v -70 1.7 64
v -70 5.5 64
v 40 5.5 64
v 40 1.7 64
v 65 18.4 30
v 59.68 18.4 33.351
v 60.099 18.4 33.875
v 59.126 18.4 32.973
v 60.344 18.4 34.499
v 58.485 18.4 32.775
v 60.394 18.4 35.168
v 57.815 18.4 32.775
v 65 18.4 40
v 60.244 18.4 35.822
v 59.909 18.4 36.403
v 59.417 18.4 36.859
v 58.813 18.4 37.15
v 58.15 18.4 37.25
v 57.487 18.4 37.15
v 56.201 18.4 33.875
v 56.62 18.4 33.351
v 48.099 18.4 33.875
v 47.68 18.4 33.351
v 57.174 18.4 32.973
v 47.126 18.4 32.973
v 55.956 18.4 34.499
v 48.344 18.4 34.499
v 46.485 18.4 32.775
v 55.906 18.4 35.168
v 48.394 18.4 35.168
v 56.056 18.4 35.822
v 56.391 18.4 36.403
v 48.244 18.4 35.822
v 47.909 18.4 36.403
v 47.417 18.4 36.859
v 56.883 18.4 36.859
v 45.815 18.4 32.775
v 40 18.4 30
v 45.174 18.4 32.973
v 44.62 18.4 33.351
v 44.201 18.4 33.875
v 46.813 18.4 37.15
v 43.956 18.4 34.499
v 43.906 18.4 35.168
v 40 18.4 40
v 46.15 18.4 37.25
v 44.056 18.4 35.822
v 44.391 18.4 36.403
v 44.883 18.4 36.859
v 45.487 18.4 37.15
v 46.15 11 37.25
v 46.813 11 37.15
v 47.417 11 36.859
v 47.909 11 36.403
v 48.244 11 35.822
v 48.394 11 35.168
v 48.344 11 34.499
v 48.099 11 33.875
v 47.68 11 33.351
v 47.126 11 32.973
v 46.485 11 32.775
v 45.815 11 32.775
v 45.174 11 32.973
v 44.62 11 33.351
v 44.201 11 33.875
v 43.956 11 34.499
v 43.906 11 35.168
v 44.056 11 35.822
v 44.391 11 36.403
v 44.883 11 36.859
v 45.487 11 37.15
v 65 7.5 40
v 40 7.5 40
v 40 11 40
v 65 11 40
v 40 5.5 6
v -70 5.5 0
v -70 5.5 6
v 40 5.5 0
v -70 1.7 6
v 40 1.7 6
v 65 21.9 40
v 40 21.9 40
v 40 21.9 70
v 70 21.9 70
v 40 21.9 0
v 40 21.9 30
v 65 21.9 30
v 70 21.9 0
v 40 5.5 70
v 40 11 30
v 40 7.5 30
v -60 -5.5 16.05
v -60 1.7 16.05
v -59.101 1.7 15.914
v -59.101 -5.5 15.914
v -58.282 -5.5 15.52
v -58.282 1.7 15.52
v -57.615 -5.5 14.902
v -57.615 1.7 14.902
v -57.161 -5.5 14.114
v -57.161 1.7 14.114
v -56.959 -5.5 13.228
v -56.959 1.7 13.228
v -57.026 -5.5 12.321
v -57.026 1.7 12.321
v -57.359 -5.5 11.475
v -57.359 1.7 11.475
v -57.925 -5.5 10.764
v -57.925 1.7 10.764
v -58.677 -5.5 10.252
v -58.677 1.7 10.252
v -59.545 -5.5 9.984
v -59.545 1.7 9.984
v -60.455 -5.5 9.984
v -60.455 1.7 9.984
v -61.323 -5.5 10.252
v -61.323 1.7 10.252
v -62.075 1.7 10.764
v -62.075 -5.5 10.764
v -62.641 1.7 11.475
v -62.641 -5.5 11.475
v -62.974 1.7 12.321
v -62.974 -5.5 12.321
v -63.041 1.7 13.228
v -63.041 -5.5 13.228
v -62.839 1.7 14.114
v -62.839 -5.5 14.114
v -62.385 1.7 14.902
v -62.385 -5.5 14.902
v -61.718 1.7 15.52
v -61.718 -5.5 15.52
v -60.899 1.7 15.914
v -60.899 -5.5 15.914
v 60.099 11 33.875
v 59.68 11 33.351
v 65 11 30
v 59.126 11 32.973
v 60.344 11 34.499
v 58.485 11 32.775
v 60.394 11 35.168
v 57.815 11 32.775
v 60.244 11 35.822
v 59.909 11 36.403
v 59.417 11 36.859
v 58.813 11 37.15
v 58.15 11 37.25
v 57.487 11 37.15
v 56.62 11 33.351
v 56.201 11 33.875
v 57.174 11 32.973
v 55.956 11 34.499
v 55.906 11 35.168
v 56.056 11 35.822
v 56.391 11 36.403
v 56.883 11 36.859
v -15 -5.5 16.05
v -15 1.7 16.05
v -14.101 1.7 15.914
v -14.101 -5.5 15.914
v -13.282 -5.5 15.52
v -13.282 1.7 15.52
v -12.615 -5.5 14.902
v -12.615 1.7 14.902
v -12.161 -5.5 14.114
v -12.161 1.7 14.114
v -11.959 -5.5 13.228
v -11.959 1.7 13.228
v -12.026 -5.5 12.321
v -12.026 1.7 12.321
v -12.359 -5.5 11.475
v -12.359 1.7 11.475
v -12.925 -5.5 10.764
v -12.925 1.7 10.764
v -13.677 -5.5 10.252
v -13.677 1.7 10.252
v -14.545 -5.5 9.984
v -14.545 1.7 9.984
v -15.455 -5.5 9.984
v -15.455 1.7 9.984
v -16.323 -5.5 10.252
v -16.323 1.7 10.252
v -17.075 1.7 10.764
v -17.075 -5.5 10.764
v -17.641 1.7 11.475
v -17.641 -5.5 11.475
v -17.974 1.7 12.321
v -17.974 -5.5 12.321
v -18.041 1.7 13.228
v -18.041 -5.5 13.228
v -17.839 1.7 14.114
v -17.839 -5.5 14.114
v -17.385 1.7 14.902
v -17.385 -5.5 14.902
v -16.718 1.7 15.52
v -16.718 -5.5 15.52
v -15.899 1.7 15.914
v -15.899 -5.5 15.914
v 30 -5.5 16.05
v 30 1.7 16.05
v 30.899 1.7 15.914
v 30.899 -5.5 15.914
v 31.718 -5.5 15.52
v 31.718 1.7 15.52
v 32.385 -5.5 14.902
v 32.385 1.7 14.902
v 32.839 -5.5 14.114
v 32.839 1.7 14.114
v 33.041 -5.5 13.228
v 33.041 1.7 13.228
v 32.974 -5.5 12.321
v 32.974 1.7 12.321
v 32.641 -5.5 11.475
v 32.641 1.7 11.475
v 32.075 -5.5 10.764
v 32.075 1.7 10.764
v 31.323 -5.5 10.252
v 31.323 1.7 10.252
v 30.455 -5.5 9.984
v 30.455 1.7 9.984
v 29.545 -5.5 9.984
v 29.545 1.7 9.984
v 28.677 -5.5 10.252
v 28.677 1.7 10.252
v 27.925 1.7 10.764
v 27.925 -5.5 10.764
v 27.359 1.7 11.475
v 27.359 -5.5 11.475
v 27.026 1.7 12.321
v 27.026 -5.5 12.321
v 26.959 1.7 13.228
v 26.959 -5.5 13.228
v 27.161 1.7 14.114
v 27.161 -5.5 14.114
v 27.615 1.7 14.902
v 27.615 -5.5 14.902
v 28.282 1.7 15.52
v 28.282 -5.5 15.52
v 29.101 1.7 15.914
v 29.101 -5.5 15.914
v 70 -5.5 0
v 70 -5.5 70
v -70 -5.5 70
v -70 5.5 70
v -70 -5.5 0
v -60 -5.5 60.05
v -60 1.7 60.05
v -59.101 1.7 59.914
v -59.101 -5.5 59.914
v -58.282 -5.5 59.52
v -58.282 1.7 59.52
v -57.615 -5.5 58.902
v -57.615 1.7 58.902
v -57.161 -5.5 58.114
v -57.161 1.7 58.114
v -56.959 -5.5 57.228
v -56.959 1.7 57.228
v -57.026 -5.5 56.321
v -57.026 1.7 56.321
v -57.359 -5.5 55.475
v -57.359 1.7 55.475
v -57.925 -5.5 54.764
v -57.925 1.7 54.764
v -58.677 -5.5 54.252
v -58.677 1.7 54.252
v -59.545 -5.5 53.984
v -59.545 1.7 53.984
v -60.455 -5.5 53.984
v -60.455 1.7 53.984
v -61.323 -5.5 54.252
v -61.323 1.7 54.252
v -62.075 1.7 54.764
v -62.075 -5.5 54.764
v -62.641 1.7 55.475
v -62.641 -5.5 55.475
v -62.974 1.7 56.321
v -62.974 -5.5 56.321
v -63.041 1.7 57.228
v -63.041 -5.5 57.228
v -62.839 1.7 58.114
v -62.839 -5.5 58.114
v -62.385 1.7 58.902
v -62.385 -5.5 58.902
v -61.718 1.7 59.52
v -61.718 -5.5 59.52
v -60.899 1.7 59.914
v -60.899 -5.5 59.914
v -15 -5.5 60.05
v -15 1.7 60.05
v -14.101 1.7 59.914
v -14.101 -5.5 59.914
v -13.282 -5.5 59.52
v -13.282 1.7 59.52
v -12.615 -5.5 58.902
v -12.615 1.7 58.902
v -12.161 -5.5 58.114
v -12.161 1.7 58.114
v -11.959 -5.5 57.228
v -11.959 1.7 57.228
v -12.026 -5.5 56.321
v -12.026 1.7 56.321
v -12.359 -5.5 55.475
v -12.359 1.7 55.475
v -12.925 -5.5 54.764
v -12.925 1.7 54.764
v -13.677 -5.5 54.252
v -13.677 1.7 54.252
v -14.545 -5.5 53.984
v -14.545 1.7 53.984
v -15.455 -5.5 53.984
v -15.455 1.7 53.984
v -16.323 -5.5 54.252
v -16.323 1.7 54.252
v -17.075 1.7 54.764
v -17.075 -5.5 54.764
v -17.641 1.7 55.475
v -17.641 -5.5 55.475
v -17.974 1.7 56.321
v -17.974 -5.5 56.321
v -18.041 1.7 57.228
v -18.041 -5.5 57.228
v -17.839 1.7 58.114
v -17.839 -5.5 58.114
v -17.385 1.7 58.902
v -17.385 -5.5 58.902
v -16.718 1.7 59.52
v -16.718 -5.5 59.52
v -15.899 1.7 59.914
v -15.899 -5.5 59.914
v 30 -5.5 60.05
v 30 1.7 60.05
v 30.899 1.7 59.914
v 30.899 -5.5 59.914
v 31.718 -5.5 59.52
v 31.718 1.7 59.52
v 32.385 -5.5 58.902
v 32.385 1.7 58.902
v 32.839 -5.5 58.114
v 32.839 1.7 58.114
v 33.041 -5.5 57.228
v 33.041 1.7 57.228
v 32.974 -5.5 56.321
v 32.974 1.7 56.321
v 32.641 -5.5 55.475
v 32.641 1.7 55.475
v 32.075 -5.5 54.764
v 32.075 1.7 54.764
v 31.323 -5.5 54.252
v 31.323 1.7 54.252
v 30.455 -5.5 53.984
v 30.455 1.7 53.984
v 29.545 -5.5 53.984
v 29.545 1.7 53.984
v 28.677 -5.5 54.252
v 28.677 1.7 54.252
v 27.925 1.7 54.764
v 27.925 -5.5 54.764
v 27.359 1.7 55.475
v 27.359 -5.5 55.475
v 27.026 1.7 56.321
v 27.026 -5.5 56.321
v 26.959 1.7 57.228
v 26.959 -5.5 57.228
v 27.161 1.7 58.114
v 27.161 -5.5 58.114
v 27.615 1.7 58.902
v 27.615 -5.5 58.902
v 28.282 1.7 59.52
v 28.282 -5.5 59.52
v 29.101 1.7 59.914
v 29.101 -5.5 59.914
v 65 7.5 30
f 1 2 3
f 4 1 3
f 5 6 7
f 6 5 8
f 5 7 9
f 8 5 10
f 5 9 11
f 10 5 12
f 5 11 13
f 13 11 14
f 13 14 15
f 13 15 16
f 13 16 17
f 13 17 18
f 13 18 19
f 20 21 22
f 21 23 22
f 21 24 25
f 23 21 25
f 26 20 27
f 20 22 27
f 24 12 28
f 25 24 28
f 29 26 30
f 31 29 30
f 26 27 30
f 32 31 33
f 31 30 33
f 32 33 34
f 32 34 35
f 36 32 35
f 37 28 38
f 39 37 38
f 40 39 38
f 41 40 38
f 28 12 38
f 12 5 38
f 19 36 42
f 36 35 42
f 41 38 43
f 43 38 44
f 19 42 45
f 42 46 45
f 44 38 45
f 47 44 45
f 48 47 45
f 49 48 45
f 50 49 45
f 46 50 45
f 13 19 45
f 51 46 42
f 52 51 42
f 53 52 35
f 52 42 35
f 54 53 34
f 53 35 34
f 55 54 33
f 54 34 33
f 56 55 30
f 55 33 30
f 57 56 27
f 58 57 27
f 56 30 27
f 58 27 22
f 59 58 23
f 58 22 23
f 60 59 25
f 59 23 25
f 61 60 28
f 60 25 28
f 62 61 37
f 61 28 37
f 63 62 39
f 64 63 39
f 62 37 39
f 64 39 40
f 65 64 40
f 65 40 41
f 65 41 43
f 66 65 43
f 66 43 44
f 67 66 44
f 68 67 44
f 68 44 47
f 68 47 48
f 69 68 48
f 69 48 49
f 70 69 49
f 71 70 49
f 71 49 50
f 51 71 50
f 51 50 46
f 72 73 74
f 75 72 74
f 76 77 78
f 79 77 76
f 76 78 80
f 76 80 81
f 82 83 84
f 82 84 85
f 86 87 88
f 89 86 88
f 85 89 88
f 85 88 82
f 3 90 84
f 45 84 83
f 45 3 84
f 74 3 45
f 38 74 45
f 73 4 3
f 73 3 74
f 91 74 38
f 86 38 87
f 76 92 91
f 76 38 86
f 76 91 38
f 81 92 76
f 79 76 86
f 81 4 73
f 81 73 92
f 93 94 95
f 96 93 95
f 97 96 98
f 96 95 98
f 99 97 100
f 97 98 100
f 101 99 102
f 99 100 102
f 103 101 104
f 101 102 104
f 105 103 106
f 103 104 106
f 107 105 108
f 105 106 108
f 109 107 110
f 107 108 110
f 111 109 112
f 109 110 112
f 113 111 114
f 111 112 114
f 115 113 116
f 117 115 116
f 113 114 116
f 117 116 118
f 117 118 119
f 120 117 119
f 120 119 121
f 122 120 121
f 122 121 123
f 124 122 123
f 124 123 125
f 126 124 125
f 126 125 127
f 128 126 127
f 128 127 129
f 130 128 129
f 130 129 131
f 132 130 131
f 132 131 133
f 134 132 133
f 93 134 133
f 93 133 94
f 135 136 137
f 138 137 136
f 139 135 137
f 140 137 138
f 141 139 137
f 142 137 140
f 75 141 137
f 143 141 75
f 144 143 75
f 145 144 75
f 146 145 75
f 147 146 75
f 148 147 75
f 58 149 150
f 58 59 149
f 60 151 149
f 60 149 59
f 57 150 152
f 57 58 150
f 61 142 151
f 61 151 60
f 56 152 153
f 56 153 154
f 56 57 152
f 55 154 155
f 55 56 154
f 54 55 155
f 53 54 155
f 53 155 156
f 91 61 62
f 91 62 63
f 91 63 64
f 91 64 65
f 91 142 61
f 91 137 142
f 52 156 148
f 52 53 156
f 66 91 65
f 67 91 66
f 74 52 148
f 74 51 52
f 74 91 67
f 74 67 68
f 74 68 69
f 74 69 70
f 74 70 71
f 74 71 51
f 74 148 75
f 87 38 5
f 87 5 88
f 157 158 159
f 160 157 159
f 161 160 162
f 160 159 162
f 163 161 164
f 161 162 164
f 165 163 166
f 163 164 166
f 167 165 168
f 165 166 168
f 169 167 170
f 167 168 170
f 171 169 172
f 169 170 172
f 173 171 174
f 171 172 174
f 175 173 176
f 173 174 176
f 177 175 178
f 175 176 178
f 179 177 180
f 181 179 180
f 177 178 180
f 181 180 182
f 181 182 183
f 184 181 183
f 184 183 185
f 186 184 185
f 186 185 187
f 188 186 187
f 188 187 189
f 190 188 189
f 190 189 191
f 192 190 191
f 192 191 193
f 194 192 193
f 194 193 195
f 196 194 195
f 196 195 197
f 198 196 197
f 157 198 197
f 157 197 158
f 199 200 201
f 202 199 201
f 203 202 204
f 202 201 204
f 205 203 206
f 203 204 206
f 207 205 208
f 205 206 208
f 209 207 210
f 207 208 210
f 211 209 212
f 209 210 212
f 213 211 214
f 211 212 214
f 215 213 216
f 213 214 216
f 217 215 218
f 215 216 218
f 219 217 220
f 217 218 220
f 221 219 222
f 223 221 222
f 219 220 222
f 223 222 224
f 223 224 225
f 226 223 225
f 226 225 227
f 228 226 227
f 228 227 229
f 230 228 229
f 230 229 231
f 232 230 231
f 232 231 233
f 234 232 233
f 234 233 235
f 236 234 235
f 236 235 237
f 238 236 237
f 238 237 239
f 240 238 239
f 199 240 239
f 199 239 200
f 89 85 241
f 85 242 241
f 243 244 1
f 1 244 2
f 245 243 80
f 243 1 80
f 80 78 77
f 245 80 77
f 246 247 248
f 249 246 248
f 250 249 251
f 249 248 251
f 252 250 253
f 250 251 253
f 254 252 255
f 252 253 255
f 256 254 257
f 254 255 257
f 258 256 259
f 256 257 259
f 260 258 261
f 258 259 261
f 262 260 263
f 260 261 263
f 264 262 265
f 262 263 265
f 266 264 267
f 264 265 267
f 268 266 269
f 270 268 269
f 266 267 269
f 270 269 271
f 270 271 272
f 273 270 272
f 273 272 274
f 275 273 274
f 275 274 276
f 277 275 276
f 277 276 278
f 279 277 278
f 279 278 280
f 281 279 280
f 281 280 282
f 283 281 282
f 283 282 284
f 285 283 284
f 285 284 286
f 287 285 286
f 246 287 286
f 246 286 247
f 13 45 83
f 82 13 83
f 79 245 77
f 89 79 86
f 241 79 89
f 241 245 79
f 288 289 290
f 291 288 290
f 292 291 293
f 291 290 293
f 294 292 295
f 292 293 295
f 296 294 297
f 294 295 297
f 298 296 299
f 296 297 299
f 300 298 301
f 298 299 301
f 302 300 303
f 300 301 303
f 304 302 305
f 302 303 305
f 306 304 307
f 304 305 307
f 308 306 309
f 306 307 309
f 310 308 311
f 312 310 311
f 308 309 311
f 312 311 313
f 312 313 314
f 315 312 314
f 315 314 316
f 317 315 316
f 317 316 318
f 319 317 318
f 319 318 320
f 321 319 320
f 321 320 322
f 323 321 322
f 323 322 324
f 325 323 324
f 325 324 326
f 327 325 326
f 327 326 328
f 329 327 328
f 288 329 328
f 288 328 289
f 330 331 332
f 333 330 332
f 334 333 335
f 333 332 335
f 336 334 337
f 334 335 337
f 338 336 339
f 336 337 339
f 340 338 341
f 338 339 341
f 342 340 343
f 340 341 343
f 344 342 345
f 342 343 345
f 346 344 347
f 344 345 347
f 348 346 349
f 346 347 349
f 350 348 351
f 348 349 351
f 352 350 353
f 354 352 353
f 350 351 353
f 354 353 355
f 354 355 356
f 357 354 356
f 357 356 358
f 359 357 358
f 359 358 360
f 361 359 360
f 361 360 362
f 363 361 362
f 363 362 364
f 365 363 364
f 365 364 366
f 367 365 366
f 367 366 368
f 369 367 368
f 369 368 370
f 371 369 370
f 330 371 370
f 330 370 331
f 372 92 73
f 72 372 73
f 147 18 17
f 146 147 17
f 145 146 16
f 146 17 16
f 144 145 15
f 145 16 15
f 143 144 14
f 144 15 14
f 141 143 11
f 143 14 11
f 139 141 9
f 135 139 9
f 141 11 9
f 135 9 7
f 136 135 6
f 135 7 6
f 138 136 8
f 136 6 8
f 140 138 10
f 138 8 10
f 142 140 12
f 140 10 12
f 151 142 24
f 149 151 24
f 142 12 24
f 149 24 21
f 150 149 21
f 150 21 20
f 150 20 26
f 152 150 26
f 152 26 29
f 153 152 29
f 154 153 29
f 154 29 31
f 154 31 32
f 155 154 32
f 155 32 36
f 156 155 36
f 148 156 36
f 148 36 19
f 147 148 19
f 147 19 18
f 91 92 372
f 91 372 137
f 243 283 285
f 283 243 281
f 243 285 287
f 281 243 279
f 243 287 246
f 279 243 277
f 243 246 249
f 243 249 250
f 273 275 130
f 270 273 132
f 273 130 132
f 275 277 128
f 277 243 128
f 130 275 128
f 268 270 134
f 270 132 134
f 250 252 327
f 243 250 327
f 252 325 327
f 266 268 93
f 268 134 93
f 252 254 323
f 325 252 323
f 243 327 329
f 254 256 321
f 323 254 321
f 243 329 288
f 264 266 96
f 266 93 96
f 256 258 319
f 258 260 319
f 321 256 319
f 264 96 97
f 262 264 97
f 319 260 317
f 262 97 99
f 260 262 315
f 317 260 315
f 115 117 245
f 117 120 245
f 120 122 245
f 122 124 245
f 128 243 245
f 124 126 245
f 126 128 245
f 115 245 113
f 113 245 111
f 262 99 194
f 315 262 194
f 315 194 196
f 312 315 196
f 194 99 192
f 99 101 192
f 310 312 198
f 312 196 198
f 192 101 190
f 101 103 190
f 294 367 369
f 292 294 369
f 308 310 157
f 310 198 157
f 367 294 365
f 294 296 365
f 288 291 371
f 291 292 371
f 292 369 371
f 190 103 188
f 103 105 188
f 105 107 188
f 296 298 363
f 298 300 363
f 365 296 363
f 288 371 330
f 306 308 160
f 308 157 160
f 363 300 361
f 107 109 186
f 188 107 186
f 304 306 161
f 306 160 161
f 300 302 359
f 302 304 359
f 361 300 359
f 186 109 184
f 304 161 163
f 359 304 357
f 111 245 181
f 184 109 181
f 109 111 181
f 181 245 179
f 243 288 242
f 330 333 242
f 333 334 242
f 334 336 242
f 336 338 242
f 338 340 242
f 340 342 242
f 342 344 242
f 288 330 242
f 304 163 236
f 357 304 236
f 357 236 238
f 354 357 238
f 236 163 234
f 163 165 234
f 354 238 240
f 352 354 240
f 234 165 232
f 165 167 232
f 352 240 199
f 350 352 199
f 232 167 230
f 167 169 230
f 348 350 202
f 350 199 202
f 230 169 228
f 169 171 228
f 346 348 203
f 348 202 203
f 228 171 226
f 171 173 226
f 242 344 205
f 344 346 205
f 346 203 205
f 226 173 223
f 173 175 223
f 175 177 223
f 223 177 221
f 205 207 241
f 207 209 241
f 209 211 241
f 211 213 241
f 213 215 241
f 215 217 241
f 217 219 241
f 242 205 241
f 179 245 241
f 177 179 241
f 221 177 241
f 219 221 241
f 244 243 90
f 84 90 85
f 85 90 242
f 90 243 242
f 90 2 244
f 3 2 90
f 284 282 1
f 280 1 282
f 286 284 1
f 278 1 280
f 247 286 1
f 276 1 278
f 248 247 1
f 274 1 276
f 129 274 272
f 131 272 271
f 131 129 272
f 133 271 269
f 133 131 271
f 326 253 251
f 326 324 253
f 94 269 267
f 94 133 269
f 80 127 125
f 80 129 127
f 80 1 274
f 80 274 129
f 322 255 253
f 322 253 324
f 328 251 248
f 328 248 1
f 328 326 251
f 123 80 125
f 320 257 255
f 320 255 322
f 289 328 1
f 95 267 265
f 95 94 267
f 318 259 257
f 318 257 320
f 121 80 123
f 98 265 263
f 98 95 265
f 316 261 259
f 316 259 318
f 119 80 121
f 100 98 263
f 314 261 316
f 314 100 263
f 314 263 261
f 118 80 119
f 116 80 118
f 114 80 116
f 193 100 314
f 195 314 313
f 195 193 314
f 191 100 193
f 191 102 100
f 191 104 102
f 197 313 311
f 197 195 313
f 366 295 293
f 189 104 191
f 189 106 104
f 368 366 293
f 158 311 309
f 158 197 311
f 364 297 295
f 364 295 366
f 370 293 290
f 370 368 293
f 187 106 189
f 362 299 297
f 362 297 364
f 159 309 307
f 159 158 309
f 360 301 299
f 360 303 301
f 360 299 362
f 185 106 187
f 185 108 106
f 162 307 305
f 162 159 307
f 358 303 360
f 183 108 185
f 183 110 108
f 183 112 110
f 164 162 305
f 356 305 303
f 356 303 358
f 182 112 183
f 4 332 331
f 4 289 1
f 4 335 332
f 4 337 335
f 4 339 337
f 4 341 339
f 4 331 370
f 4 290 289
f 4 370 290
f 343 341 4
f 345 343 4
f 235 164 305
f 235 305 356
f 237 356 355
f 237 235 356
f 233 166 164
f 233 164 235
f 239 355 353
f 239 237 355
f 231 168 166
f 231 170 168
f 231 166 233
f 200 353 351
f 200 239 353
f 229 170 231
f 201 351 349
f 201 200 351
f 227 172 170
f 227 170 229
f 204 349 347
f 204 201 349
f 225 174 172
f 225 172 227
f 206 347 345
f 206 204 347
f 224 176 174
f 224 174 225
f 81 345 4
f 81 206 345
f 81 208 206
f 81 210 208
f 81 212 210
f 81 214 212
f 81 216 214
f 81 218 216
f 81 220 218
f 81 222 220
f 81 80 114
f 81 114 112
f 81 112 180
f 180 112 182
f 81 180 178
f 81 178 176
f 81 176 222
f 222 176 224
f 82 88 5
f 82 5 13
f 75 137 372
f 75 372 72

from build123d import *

# Parameters (mm, degrees)
ESQUISSE1_W             = 140
ESQUISSE1_H             = 11
BOSS_EXTRU_1_DEPTH      = 70
ENL_V_MAT_EXTRU_1_DEPTH = 110
ESQUISSE6_W             = 30
ESQUISSE6_H             = 70
BOSS_EXTRU_3_DEPTH      = 16.4
ESQUISSE9_W             = 10
ESQUISSE9_H             = 3.5
ENL_V_MAT_EXTRU_3_DEPTH = 25
ESQUISSE10_R            = 2.25
ENL_V_MAT_EXTRU_4_DEPTH = 10.8
ESQUISSE12_W            = 110
ESQUISSE12_H            = 29
ESQUISSE12_R            = 3.05
ESQUISSE12_H_2          = 9.4
ENL_V_MAT_EXTRU_6_DEPTH = 3.8
ESQUISSE12_3_R          = 3.05
ENL_V_MAT_EXTRU_7_DEPTH = 12
BOSS_EXTRU_4_REACH      = 103.035
ESQUISSE13_W            = 110
ESQUISSE13_H            = 17.195348208


with BuildPart() as part:
    # Esquisse1 → Boss.-Extru.1 (new body)
    with BuildSketch(Plane.XY):
        Rectangle(ESQUISSE1_W, ESQUISSE1_H)
    extrude(amount=BOSS_EXTRU_1_DEPTH)

    # Esquisse2 → Enlèv. mat.-Extru.1 (cut)
    with BuildSketch(Plane.ZY.offset(70)):
        with BuildLine():
            Line((25.6, 5.5), (44.4, 5.5))
            ThreePointArc((44.4, 5.5), (35, -3.9), (25.6, 5.5))
        make_face()
    extrude(amount=-ENL_V_MAT_EXTRU_1_DEPTH, mode=Mode.SUBTRACT)

    # Esquisse6 → Boss.-Extru.3 (add)
    with BuildSketch(Plane(origin=(0, 5.5, 0), x_dir=(1, 0, 0), z_dir=(0, 1, 0))):
        with Locations((55, -35)):
            Rectangle(ESQUISSE6_W, ESQUISSE6_H)
    extrude(amount=BOSS_EXTRU_3_DEPTH)

    # Esquisse9 → Enlèv. mat.-Extru.3 (cut)
    with BuildSketch(Plane.ZY.offset(-40)):
        with Locations((35, 9.25)):
            Rectangle(ESQUISSE9_W, ESQUISSE9_H)
        with Locations((35, 20.15)):
            Rectangle(ESQUISSE9_W, ESQUISSE9_H)
    extrude(amount=-ENL_V_MAT_EXTRU_3_DEPTH, mode=Mode.SUBTRACT)

    # Esquisse10 → Enlèv. mat.-Extru.4 (cut)
    with BuildSketch(Plane(origin=(0, 18.4, 0), x_dir=(1, 0, 0), z_dir=(0, 1, 0))):
        with Locations(Location((58.15, -35, 0), (0, 0, 270))):
            Circle(ESQUISSE10_R)
        with Locations(Location((46.15, -35, 0), (0, 0, 270))):
            Circle(ESQUISSE10_R)
    extrude(amount=-ENL_V_MAT_EXTRU_4_DEPTH, mode=Mode.SUBTRACT)

    # Esquisse12 → Enlèv. mat.-Extru.6 (cut)
    # profile 1 of 3: a face of its own
    with BuildSketch(Plane(origin=(0, 5.5, 0), x_dir=(1, 0, 0), z_dir=(0, 1, 0))):
        with Locations((-15, -20.5)):
            Rectangle(ESQUISSE12_W, ESQUISSE12_H)
        with Locations(Location((30, -13, 0), (0, 0, 270))):
            Circle(ESQUISSE12_R, mode=Mode.SUBTRACT)
        with Locations(Location((-15, -13, 0), (0, 0, 270))):
            Circle(ESQUISSE12_R, mode=Mode.SUBTRACT)
        with Locations(Location((-60, -13, 0), (0, 0, 270))):
            Circle(ESQUISSE12_R, mode=Mode.SUBTRACT)
    # profile 2 of 3: a face of its own
    with BuildSketch(Plane(origin=(0, 5.5, 0), x_dir=(1, 0, 0), z_dir=(0, 1, 0))):
        with Locations((-15, -49.5)):
            Rectangle(ESQUISSE12_W, ESQUISSE12_H)
        with Locations(Location((-15, -57, 0), (0, 0, 270))):
            Circle(ESQUISSE12_R, mode=Mode.SUBTRACT)
        with Locations(Location((-60, -57, 0), (0, 0, 270))):
            Circle(ESQUISSE12_R, mode=Mode.SUBTRACT)
        with Locations(Location((30, -57, 0), (0, 0, 270))):
            Circle(ESQUISSE12_R, mode=Mode.SUBTRACT)
    # profile 3 of 3: a face of its own
    with BuildSketch(Plane(origin=(0, 5.5, 0), x_dir=(1, 0, 0), z_dir=(0, 1, 0))):
        with Locations((-15, -39.7)):
            Rectangle(ESQUISSE12_W, ESQUISSE12_H_2)
    extrude(amount=-ENL_V_MAT_EXTRU_6_DEPTH, mode=Mode.SUBTRACT)

    # Esquisse12<3> → Enlèv. mat.-Extru.7 (cut)
    with BuildSketch(Plane(origin=(0, 5.5, 0), x_dir=(1, 0, 0), z_dir=(0, 1, 0))):
        with Locations(Location((-60, -13, 0), (0, 0, 270))):
            Circle(ESQUISSE12_3_R)
        with Locations(Location((-15, -13, 0), (0, 0, 270))):
            Circle(ESQUISSE12_3_R)
        with Locations(Location((30, -13, 0), (0, 0, 270))):
            Circle(ESQUISSE12_3_R)
        with Locations(Location((30, -57, 0), (0, 0, 270))):
            Circle(ESQUISSE12_3_R)
        with Locations(Location((-60, -57, 0), (0, 0, 270))):
            Circle(ESQUISSE12_3_R)
        with Locations(Location((-15, -57, 0), (0, 0, 270))):
            Circle(ESQUISSE12_3_R)
    extrude(amount=-ENL_V_MAT_EXTRU_7_DEPTH, mode=Mode.SUBTRACT)

    # Esquisse13 → Boss.-Extru.4 (add, up to next)
    with BuildSketch(Plane(origin=(0, 1.7, 0), x_dir=(1, 0, 0), z_dir=(0, 1, 0)), mode=Mode.PRIVATE) as boss_extru_4_sk1:
        with Locations((-15, -35)):
            Rectangle(ESQUISSE13_W, ESQUISSE13_H)
    boss_extru_4_tool1 = extrude(boss_extru_4_sk1.sketch, amount=-BOSS_EXTRU_4_REACH, mode=Mode.PRIVATE) - part.part
    add(boss_extru_4_tool1.solids().sort_by_distance((-15, 1.7, 35))[0])


solid = part.part
